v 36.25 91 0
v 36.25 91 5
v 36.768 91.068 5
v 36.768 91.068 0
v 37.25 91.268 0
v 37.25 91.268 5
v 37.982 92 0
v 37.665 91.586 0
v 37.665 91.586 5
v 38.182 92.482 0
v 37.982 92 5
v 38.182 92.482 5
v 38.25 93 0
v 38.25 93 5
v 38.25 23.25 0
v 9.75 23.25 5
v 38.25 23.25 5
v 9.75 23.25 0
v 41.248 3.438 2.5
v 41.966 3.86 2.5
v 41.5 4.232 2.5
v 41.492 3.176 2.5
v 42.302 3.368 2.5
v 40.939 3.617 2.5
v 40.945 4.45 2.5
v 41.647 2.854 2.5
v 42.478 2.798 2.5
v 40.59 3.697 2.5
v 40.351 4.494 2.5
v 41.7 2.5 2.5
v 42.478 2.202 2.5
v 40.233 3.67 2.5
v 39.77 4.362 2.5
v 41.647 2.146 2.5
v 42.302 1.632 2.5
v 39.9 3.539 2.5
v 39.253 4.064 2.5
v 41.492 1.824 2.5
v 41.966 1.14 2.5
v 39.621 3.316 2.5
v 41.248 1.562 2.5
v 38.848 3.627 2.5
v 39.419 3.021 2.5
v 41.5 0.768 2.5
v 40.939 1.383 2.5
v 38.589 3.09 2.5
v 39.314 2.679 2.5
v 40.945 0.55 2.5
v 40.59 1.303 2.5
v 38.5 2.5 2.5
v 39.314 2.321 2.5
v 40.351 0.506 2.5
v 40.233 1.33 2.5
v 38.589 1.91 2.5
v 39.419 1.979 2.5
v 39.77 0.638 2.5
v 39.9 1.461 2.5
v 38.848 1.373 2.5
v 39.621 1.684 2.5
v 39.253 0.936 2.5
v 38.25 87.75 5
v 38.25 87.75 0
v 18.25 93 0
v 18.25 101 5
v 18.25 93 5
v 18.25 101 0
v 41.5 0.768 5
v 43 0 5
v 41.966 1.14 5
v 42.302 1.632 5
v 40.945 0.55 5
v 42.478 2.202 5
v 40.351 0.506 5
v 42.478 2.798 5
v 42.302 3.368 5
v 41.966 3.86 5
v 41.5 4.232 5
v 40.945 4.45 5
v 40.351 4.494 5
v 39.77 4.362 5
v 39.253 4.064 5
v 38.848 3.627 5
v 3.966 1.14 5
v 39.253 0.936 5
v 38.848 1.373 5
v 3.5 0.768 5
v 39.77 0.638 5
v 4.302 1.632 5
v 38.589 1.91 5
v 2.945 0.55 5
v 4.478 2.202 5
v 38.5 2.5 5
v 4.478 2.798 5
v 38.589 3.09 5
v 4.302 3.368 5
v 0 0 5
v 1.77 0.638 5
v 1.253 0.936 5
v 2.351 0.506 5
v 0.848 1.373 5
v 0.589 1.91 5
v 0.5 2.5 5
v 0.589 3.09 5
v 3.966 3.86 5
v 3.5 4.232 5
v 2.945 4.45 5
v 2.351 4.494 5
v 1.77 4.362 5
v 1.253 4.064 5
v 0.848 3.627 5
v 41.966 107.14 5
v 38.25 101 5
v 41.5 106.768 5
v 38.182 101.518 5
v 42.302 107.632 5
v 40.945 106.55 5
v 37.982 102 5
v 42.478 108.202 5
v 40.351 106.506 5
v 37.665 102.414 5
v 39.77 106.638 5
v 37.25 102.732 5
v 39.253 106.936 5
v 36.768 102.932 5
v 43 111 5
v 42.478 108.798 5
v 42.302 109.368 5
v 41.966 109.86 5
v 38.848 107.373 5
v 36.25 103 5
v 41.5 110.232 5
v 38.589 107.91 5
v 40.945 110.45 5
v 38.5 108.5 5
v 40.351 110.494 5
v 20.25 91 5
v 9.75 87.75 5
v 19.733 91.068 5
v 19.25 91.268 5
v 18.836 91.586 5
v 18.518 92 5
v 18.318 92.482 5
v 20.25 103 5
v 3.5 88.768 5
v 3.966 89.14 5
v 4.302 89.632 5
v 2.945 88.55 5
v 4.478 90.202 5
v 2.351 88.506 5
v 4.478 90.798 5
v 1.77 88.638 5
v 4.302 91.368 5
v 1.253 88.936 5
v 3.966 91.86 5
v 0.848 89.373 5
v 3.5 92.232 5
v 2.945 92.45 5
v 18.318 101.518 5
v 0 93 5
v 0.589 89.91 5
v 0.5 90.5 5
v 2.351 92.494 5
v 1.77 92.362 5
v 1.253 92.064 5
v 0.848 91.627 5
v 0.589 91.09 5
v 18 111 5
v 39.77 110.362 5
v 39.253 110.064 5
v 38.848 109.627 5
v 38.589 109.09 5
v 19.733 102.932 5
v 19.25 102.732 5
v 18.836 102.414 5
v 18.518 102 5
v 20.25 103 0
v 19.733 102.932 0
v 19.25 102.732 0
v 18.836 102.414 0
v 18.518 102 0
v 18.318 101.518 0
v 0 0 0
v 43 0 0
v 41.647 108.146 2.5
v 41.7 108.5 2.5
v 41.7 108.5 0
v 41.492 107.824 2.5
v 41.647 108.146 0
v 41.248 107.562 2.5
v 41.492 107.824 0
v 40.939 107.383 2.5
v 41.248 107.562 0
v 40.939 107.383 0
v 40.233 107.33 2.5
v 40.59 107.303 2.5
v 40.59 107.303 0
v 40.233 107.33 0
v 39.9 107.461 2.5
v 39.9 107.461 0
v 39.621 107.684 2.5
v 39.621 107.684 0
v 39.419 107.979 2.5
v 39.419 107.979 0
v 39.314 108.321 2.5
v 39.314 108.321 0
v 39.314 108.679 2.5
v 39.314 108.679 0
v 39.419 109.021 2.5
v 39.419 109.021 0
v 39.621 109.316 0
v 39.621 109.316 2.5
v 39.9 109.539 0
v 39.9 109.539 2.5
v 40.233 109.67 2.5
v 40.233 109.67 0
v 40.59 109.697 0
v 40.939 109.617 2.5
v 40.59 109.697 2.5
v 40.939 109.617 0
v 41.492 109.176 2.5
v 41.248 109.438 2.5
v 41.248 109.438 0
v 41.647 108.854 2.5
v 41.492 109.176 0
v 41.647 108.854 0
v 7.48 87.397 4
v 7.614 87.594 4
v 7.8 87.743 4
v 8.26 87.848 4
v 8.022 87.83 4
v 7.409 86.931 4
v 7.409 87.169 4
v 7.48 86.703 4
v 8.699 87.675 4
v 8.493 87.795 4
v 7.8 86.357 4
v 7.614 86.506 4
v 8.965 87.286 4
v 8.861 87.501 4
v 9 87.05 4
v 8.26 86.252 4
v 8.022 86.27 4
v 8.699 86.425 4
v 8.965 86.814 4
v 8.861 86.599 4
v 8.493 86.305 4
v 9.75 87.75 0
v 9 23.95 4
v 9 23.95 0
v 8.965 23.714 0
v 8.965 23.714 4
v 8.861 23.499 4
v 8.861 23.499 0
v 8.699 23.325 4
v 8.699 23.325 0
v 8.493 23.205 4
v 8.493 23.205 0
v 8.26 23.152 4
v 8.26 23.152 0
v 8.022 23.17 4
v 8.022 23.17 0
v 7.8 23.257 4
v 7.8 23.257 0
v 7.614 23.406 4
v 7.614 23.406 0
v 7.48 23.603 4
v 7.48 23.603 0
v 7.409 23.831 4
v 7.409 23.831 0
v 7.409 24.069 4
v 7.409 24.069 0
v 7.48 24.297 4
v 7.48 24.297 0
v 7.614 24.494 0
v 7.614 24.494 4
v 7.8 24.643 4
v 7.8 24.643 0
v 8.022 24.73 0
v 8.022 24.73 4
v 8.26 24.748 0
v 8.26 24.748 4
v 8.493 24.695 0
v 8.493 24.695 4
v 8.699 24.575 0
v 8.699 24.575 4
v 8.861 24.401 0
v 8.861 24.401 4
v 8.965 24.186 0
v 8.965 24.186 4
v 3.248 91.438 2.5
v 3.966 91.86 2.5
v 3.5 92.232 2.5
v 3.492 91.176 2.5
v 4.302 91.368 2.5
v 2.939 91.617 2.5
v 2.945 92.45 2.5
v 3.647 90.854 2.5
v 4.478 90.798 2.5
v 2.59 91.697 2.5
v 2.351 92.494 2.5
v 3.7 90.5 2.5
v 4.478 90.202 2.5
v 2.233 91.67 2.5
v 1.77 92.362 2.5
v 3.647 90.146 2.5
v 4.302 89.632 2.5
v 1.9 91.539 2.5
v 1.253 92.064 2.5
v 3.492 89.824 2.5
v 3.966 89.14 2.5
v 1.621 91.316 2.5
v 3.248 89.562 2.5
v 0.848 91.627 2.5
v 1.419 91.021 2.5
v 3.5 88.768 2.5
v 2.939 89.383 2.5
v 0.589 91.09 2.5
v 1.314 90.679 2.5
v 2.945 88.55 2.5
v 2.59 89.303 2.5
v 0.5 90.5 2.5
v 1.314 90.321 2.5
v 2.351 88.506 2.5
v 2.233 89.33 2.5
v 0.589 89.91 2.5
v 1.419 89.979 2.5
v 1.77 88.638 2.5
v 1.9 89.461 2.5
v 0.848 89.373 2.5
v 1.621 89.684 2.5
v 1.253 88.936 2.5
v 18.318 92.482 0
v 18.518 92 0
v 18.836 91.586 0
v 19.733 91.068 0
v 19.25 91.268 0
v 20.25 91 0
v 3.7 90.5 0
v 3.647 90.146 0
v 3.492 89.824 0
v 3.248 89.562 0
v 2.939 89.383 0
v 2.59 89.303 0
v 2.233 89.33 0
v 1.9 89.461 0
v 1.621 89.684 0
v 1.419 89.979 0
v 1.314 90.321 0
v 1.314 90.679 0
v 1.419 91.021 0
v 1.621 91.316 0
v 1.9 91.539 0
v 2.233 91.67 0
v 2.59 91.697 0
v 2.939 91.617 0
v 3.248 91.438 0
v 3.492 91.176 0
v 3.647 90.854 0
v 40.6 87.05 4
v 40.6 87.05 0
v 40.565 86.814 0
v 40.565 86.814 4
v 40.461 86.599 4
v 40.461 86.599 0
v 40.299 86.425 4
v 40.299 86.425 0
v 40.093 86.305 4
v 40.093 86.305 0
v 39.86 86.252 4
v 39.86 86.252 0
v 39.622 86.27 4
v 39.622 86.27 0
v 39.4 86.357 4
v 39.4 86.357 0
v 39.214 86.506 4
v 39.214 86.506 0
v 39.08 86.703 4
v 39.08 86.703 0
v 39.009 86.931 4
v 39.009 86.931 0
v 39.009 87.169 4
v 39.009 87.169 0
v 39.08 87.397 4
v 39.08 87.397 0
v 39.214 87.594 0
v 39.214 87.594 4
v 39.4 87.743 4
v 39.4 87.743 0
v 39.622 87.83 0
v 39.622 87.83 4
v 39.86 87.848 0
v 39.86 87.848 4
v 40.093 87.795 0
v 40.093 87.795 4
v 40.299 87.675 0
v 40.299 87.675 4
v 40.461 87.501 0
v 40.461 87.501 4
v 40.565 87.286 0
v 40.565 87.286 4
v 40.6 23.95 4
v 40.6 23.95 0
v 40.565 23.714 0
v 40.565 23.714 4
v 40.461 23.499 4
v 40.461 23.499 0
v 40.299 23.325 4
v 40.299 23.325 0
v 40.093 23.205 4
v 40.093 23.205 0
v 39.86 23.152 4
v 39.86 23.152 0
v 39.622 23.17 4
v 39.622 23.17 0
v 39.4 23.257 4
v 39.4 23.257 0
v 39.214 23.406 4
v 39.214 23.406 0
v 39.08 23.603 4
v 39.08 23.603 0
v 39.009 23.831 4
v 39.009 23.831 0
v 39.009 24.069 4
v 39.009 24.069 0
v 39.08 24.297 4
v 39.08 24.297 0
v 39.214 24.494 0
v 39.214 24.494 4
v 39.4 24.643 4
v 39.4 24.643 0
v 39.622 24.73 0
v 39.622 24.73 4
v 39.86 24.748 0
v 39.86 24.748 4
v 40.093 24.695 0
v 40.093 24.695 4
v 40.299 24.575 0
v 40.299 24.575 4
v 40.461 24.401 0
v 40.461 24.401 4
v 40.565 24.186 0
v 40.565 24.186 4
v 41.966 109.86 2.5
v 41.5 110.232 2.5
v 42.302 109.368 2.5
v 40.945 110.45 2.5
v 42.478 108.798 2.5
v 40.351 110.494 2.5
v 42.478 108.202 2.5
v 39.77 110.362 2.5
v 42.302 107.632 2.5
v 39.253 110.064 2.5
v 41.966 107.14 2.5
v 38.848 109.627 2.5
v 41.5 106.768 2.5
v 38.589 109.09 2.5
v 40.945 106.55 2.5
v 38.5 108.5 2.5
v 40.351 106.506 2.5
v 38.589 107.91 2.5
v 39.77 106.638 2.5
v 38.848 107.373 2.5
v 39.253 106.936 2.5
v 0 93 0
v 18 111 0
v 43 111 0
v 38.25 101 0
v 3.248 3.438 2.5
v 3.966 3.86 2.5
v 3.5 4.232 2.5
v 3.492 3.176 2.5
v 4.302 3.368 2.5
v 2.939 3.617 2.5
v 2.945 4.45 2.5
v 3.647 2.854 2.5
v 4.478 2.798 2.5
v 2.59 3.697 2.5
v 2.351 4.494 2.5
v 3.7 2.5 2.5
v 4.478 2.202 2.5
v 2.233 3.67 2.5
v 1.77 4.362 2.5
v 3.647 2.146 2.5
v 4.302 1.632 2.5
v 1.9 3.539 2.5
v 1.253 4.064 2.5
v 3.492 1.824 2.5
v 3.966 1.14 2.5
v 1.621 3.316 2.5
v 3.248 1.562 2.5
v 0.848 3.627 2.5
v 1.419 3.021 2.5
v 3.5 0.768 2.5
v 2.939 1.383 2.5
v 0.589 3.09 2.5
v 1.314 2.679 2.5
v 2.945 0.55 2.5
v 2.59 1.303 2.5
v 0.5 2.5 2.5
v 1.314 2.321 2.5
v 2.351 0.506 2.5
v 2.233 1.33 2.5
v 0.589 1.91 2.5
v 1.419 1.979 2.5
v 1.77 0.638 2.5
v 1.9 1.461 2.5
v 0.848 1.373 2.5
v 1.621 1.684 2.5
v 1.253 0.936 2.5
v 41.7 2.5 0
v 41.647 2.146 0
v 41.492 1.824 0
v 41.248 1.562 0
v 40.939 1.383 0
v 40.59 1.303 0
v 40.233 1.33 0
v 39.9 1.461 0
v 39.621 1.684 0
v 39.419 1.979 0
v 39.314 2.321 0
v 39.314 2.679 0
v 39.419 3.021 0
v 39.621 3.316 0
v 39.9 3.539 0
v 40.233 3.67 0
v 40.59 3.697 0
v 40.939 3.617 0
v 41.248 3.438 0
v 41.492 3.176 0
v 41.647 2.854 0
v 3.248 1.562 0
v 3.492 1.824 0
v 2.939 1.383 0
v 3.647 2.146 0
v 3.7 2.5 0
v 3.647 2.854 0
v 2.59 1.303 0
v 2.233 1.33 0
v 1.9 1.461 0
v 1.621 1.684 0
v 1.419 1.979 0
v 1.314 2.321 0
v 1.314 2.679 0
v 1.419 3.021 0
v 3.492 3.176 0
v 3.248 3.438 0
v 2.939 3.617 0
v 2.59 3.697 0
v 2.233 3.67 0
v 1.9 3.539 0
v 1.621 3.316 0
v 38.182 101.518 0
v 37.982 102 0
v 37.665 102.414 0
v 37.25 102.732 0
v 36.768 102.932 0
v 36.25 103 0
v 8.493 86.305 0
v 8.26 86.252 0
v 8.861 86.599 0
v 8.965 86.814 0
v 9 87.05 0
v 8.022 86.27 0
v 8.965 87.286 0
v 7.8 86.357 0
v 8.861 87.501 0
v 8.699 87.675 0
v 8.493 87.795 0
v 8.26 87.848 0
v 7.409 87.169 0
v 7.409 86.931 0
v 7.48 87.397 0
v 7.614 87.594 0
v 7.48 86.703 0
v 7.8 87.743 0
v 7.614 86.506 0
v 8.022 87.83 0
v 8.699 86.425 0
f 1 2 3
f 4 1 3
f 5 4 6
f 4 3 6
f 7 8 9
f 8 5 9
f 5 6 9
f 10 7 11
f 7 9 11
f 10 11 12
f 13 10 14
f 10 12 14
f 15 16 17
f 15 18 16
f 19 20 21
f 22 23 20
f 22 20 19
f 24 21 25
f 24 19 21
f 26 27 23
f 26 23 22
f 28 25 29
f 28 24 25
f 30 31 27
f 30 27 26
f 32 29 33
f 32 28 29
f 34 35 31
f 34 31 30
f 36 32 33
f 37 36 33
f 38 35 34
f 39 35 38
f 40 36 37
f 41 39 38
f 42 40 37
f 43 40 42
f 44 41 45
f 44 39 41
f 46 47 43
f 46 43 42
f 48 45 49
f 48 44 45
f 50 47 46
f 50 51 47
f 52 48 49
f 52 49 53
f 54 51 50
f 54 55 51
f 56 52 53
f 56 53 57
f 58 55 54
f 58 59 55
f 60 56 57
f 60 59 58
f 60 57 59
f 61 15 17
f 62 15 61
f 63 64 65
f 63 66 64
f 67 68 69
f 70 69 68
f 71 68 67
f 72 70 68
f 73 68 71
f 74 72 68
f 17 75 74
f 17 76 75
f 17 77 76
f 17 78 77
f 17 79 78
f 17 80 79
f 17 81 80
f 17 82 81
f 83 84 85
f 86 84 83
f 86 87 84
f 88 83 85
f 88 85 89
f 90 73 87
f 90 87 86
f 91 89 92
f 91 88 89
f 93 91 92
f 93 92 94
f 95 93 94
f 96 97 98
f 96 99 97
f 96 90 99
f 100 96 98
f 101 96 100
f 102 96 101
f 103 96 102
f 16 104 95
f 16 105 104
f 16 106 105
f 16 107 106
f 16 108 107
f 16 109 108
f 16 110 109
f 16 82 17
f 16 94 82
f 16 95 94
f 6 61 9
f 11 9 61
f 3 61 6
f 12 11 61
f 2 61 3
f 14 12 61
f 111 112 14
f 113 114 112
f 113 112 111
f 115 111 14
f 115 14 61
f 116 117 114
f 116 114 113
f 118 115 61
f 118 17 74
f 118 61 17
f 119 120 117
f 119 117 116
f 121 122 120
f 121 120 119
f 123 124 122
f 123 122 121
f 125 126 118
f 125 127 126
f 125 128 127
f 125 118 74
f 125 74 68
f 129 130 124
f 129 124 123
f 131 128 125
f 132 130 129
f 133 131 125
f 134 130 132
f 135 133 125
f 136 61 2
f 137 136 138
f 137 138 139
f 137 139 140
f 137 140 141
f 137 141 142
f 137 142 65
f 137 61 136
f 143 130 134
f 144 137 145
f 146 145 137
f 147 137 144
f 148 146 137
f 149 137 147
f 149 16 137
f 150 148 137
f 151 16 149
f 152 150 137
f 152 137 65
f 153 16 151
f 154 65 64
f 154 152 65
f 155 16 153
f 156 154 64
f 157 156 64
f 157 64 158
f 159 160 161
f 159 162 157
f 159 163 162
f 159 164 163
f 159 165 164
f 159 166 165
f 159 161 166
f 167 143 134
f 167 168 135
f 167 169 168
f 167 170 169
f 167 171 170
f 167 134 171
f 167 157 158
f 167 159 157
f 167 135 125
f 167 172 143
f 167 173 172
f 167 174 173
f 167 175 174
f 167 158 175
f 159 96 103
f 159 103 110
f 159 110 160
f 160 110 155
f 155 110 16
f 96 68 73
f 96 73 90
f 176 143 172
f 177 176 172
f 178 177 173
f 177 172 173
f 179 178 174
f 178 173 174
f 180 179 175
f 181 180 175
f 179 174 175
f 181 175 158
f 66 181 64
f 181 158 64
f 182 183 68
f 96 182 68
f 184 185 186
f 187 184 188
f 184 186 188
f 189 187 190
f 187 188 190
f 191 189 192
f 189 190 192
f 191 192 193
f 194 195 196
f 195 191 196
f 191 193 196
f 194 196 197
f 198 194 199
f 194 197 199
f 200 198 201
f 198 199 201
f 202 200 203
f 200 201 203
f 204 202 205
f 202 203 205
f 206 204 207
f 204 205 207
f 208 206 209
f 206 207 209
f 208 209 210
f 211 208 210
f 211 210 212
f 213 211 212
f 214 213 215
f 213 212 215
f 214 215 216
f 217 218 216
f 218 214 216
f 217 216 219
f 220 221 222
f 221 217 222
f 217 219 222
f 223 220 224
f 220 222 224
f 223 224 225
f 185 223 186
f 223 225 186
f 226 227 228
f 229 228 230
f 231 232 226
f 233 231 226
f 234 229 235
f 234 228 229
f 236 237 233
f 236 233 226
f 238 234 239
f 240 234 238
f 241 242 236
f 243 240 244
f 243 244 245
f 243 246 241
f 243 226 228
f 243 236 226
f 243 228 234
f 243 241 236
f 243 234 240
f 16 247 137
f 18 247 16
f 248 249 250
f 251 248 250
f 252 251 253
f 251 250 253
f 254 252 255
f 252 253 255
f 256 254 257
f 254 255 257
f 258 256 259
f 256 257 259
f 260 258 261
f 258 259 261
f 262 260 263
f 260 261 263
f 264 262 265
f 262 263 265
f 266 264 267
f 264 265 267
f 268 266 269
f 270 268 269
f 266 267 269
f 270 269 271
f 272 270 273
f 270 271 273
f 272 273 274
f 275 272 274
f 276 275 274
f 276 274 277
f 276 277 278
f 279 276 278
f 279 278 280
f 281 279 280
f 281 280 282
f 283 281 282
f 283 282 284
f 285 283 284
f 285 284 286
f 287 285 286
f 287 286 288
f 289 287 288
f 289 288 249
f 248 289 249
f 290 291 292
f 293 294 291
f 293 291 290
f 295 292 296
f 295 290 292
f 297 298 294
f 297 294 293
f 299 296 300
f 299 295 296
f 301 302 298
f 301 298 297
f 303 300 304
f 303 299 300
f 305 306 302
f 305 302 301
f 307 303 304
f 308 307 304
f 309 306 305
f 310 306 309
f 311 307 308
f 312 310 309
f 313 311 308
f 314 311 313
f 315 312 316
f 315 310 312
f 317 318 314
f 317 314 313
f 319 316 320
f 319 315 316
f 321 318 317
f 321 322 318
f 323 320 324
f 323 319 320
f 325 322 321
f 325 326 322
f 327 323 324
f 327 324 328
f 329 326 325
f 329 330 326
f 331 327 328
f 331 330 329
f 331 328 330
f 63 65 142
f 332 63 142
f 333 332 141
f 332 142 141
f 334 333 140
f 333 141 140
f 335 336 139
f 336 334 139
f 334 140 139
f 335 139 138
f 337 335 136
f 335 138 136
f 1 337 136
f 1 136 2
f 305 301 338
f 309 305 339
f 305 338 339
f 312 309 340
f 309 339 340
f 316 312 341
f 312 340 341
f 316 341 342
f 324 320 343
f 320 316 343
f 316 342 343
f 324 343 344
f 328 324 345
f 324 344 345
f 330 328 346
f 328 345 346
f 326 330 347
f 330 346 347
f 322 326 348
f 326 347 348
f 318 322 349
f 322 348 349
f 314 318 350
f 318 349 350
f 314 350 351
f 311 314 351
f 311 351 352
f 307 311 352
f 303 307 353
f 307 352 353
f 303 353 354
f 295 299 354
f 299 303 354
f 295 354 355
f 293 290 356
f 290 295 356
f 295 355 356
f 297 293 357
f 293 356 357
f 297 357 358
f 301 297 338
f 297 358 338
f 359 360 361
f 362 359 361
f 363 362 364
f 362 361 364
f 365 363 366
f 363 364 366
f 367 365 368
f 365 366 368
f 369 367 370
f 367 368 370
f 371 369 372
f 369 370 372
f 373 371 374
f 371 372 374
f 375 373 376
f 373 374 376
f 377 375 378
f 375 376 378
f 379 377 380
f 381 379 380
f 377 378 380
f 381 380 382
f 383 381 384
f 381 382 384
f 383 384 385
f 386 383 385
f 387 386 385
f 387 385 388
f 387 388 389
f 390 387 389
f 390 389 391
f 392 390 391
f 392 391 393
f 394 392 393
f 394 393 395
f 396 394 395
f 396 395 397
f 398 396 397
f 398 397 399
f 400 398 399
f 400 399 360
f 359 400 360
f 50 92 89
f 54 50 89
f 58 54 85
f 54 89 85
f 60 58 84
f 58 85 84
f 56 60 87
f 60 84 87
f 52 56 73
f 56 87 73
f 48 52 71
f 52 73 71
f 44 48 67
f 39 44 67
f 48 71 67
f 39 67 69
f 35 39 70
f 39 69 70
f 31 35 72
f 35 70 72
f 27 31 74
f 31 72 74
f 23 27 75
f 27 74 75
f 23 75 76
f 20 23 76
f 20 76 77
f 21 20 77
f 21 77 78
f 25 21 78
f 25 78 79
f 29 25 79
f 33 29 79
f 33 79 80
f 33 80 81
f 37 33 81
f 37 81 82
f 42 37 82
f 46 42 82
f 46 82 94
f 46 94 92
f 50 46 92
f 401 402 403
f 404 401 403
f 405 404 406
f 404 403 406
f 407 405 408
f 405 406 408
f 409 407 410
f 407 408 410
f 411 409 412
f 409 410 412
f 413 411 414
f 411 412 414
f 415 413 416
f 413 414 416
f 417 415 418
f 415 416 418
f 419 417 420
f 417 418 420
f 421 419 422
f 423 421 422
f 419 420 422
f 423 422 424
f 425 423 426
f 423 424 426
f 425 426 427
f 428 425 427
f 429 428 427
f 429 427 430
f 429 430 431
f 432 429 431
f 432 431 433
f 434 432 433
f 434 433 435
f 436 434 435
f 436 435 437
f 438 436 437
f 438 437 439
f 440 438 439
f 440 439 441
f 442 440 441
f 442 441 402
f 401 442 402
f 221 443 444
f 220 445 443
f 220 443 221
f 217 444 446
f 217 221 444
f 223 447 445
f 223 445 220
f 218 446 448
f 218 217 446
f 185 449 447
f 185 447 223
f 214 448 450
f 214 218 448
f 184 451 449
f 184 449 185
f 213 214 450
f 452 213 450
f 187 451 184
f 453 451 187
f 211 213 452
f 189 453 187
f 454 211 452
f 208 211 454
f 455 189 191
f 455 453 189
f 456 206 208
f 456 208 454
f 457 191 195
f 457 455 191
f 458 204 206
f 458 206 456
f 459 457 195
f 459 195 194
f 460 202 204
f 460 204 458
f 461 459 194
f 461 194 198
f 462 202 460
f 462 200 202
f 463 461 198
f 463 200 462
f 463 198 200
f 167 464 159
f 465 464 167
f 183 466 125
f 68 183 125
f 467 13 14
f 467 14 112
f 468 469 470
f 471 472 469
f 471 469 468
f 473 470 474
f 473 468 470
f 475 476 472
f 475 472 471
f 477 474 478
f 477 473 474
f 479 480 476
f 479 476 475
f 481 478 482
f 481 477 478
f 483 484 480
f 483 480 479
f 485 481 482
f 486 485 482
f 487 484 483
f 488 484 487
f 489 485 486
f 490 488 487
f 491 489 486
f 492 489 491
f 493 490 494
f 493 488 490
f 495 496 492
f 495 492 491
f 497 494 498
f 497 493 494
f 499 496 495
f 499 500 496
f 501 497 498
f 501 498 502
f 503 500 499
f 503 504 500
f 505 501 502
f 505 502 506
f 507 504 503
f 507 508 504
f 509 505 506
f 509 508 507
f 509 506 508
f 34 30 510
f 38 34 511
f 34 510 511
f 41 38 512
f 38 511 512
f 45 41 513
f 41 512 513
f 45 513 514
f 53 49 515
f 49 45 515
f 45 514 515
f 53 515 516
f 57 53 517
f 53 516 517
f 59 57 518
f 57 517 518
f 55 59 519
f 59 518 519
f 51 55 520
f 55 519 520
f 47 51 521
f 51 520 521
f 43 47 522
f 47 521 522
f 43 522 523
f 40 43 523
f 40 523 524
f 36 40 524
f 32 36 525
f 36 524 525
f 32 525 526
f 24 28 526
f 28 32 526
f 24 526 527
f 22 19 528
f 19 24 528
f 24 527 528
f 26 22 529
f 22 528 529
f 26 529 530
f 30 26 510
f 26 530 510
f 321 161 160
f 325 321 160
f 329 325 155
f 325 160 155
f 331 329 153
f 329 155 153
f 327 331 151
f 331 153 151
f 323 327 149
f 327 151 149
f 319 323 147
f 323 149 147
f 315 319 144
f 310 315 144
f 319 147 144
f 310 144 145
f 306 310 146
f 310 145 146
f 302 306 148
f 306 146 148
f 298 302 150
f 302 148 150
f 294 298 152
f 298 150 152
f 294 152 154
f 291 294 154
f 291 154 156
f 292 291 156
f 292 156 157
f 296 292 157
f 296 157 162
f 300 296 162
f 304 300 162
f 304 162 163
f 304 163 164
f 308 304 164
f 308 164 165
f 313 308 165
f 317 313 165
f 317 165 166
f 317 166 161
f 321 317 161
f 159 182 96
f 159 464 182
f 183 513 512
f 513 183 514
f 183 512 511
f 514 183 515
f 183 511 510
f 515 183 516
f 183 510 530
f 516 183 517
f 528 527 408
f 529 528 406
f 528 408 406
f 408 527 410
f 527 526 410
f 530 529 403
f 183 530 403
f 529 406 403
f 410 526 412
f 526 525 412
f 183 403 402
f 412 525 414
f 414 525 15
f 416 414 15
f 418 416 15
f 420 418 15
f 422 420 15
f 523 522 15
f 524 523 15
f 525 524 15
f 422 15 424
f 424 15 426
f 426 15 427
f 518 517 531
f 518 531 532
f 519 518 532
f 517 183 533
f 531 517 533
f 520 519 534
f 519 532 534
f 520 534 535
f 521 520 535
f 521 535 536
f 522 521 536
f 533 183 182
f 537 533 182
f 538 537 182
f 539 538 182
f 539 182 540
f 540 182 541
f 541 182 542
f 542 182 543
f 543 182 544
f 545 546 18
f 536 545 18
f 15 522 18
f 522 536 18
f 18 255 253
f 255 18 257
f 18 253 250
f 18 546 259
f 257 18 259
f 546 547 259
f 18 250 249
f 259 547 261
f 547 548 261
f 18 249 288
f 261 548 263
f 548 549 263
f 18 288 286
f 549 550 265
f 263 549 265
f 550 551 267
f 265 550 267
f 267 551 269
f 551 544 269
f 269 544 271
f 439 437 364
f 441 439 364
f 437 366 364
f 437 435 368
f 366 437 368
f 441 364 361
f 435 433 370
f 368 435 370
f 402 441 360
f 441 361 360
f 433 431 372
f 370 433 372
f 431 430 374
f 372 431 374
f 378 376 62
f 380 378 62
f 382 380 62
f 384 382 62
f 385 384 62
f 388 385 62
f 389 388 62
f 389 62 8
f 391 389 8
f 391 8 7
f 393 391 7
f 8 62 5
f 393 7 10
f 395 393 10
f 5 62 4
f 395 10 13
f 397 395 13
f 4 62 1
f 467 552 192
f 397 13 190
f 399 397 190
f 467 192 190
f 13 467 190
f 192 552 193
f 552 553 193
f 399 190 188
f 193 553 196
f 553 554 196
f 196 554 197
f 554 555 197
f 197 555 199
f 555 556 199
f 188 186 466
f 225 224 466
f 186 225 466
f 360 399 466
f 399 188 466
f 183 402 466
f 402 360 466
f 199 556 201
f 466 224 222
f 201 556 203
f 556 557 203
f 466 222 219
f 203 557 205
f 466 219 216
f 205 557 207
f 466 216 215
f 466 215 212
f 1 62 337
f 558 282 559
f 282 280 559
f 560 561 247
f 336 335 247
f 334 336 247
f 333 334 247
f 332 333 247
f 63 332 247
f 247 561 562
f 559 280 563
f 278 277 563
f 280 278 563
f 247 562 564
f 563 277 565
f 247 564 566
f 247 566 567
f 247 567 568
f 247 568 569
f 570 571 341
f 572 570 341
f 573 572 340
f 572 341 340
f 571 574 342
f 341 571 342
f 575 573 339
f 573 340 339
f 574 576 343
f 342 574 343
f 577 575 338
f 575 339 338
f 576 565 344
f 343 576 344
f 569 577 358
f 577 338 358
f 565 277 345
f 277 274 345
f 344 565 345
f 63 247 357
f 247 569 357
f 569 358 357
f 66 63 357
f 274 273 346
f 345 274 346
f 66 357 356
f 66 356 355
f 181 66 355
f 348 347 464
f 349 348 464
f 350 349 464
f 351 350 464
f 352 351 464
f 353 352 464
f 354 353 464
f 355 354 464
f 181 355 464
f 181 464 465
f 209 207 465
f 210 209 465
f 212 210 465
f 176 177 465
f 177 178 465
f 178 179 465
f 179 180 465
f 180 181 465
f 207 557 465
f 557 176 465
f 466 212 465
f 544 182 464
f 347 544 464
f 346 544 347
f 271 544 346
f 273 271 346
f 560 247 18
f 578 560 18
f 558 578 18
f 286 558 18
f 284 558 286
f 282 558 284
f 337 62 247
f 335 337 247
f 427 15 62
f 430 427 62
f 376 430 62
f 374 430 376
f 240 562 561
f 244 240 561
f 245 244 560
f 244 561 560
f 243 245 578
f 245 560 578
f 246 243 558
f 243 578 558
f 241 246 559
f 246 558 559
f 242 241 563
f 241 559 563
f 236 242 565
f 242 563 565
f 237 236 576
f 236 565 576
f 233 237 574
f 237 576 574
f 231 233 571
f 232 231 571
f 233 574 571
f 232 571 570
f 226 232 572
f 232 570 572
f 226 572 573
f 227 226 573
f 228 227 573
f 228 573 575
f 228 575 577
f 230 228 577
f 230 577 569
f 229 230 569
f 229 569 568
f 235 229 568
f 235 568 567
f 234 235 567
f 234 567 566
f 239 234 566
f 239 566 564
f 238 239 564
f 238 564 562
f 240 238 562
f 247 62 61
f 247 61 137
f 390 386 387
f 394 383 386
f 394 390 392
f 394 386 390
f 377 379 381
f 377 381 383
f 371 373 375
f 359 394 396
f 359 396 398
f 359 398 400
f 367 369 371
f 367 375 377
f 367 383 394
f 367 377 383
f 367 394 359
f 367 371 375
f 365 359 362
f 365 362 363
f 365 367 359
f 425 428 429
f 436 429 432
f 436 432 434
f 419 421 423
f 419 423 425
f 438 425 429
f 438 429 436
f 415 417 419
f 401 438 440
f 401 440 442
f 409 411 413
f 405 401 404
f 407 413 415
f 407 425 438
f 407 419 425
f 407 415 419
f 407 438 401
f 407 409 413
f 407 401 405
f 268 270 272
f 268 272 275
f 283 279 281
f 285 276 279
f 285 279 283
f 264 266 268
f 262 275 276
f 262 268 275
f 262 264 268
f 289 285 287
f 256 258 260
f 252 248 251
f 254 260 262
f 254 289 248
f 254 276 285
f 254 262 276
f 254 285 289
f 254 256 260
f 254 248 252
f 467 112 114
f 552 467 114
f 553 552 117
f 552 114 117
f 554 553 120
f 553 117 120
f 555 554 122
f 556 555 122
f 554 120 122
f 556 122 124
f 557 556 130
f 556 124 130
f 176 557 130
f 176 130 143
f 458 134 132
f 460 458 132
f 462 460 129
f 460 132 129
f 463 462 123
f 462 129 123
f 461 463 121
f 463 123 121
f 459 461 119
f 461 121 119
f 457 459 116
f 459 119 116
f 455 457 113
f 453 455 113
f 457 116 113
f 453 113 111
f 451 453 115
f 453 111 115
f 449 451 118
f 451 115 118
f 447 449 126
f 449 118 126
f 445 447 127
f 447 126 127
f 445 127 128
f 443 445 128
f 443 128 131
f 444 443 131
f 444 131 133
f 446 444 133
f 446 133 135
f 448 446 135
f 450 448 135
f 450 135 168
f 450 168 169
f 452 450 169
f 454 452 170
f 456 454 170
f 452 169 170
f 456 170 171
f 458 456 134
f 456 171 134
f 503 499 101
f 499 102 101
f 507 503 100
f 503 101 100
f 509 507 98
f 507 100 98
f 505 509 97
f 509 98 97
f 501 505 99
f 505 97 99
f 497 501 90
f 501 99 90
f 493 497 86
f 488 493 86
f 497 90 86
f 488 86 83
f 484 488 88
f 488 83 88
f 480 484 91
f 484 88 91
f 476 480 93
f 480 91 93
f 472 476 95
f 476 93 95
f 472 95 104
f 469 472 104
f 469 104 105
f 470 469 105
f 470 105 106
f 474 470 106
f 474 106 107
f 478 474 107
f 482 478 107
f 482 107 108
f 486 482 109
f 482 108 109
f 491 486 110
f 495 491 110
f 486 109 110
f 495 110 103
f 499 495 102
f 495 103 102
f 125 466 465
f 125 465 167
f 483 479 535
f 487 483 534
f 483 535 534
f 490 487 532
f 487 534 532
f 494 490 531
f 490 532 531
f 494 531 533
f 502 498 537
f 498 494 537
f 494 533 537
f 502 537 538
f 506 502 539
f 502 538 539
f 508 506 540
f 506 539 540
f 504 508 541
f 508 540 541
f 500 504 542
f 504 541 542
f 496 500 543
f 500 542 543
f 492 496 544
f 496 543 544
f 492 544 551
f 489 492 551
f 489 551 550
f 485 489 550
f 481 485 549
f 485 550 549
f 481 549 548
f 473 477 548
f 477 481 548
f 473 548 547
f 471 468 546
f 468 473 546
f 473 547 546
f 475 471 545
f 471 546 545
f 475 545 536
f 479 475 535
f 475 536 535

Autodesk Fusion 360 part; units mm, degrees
box "BoxPrimitive1" add length 111 width 43 height 5 placed x (0, 1, 0) y (-1, 0, 0) z (0, 0, 1) at (43.0003, 0, 0)
sketch "Sketch6" plane through (0, 0, 0) normal (0, 0, -1) x (1, 0, 0)
  line L0 (0.0003, -111) -> (43.0003, -111)
  line L1 (43.0003, -111) -> (43.0003, 0)
  line L2 (43.0003, 0) -> (0.0003, 0)
  line L3 (0.0003, 0) -> (0.0003, -111)
  line L4 (0.0003, -93) -> (18.0003, -111)
  line L5 (6.5003, -22.25) -> (41.5003, -22.25) construction
  line L6 (41.5003, -22.25) -> (41.5003, -88.75) construction
  line L7 (41.5003, -88.75) -> (6.5003, -88.75) construction
  line L8 (6.5003, -88.75) -> (6.5003, -22.25) construction
  line L9 (6.5003, -22.25) -> (41.5003, -88.75) construction
  line L10 (6.5003, -88.75) -> (41.5003, -22.25) construction
  circle A0 centre (8.2003, -23.95) radius 0.8
  line L11 (38.2503, -87.75) -> (9.7503, -87.75)
  line L12 (9.7503, -87.75) -> (9.7503, -23.25)
  line L13 (9.7503, -23.25) -> (38.2503, -23.25)
  line L14 (38.2503, -23.25) -> (38.2503, -87.75)
  line L15 (38.2503, -87.75) -> (9.7503, -23.25) construction
  line L16 (9.7503, -87.75) -> (38.2503, -23.25) construction
  line L17 (18.2503, -91) -> (38.2503, -91)
  line L18 (38.2503, -91) -> (38.2503, -103)
  line L19 (38.2503, -103) -> (18.2503, -103)
  line L20 (18.2503, -103) -> (18.2503, -91)
  circle A1 centre (2.5003, -2.5) radius 1.2
  circle A2 centre (40.5003, -2.5) radius 1.2
  circle A3 centre (40.5003, -108.5) radius 1.2
  circle A4 centre (2.5003, -90.5) radius 1.2
  line L21 (24.0003, -111) -> (24.0003, 0) construction
  line L22 (0.0003, -55.5) -> (43.0003, -55.5) construction
  circle A5 centre (8.2003, -87.05) radius 0.8
  circle A6 centre (39.8003, -23.95) radius 0.8
  circle A7 centre (39.8003, -87.05) radius 0.8
  line L23 (18.2503, -91) -> (38.2503, -103) construction
  line L24 (38.2503, -91) -> (18.2503, -103) construction
  point P0 (24.0003, -55.5)
  point P1 (24.0003, -55.5)
  point P2 (24.0003, -55.5)
  point P3 (24.0003, -55.5)
  point P4 (28.2503, -97)
  dimension "d7" = 45
  dimension "d8" = 35
  dimension "d9" = 66.5
  dimension "d11" = 1.6
  dimension "d12" = 1.7
  dimension "d13" = 1.7
  dimension "d14" = 28.5
  dimension "d15" = 64.5
  dimension "d17" = 2.4
  dimension "d18" = 2.5
  dimension "d19" = 2.5
  dimension "d21" = 2.4
  dimension "d22" = 2.5
  dimension "d23" = 2.5
  dimension "d24" = 2.4
  dimension "d25" = 2.5
  dimension "d26" = 2.5
  dimension "d38" = 93
  dimension "d39" = 4.75
  dimension "d42" = 20
  dimension "d43" = 12
  dimension "d47" = 55.5
  dimension "d48" = 19
  dimension "d51" = 2.5
  dimension "d52" = 2.5
  dimension "d53" = 2.4
  dimension "d56" = 3.25
extrude "Extrude1" cut sketch "Sketch6" against normal through all contours L0 L3 L4 | L11 L12 L13 L14 | L17 L18 L19 L20 | A1 | A2 | A3 | A4
extrude "Extrude4" cut sketch "Sketch6" against normal blind 4 contours A0 | A5 | A6 | A7
thread "Thread2" "ISO Metric profile 2.0 M2x0.4 M2x0.4 6H" major diameter 2.074 minor diameter 1.623 pitch 0.4 angle 60 resizes the face on face at (39.8202, 23.1502, 2.6667) on face at (40.4829, 86.6329, 2.6667) on face at (7.4977, 86.6674, 2.6667) on face at (8.9993, 23.9101, 1.3333)
sketch "Sketch9" plane through (0, 0, 5) normal (0, 0, 1) x (-1, 0, 0)
  line L0 (-18.0003, -111) -> (-0.0003, -93)
  line L1 (-0.0003, -93) -> (-0.0003, 0)
  line L2 (-0.0003, 0) -> (-43.0003, 0)
  line L3 (-43.0003, 0) -> (-43.0003, -111)
  line L4 (-43.0003, -111) -> (-18.0003, -111)
  circle A0 centre (-40.5003, -108.5) radius 1.2
  line L5 (-18.2503, -91) -> (-18.2503, -103)
  line L6 (-18.2503, -103) -> (-38.2503, -103)
  line L7 (-38.2503, -103) -> (-38.2503, -91)
  line L8 (-38.2503, -91) -> (-18.2503, -91)
  circle A1 centre (-2.5003, -90.5) radius 1.2
  circle A2 centre (-40.5003, -2.5) radius 1.2
  line L9 (-38.2503, -87.75) -> (-38.2503, -23.25)
  line L10 (-38.2503, -23.25) -> (-9.7503, -23.25)
  line L11 (-9.7503, -23.25) -> (-9.7503, -87.75)
  line L12 (-9.7503, -87.75) -> (-38.2503, -87.75)
  circle A3 centre (-2.5003, -2.5) radius 1.2
  circle A4 centre (-2.5003, -2.5) radius 2
  circle A5 centre (-40.5003, -2.5) radius 2
  circle A6 centre (-2.5003, -90.5) radius 2
  circle A7 centre (-40.5003, -108.5) radius 2
  dimension "d32" = 4
  dimension "d33" = 4
  dimension "d34" = 4
  dimension "d35" = 4
extrude "Extrude3" cut sketch "Sketch9" against normal blind 2.5 contours A4 | A5 | A6 | A7
sketch "Sketch10" plane through (0, 0, 5) normal (0, 0, 1) x (-1, 0, 0)
  line L0 (-38.2503, -87.75) -> (-38.2503, -23.25)
  line L1 (-38.2503, -23.25) -> (-9.7503, -23.25)
  line L2 (-9.7503, -23.25) -> (-9.7503, -87.75)
  line L3 (-9.7503, -87.75) -> (-38.2503, -87.75)
  line L4 (-18.2503, -91) -> (-18.2503, -103)
  line L5 (-18.2503, -103) -> (-38.2503, -103)
  line L6 (-38.2503, -103) -> (-38.2503, -91)
  line L7 (-38.2503, -91) -> (-18.2503, -91)
  line L8 (-18.0003, -111) -> (-0.0003, -93)
  line L9 (-0.0003, -93) -> (-0.0003, 0)
  line L10 (-0.0003, 0) -> (-43.0003, 0)
  line L11 (-43.0003, 0) -> (-43.0003, -111)
  line L12 (-43.0003, -111) -> (-18.0003, -111)
  circle A0 centre (-40.5003, -108.5) radius 2
  circle A1 centre (-2.5003, -2.5) radius 2
  circle A2 centre (-2.5003, -90.5) radius 2
  circle A3 centre (-40.5003, -2.5) radius 2
fillet "Fillet1" radius 2 4 edges at (38.2503, 91, 2.5) (18.2503, 91, 2.5) (38.2503, 103, 2.5) (18.2503, 103, 2.5)
